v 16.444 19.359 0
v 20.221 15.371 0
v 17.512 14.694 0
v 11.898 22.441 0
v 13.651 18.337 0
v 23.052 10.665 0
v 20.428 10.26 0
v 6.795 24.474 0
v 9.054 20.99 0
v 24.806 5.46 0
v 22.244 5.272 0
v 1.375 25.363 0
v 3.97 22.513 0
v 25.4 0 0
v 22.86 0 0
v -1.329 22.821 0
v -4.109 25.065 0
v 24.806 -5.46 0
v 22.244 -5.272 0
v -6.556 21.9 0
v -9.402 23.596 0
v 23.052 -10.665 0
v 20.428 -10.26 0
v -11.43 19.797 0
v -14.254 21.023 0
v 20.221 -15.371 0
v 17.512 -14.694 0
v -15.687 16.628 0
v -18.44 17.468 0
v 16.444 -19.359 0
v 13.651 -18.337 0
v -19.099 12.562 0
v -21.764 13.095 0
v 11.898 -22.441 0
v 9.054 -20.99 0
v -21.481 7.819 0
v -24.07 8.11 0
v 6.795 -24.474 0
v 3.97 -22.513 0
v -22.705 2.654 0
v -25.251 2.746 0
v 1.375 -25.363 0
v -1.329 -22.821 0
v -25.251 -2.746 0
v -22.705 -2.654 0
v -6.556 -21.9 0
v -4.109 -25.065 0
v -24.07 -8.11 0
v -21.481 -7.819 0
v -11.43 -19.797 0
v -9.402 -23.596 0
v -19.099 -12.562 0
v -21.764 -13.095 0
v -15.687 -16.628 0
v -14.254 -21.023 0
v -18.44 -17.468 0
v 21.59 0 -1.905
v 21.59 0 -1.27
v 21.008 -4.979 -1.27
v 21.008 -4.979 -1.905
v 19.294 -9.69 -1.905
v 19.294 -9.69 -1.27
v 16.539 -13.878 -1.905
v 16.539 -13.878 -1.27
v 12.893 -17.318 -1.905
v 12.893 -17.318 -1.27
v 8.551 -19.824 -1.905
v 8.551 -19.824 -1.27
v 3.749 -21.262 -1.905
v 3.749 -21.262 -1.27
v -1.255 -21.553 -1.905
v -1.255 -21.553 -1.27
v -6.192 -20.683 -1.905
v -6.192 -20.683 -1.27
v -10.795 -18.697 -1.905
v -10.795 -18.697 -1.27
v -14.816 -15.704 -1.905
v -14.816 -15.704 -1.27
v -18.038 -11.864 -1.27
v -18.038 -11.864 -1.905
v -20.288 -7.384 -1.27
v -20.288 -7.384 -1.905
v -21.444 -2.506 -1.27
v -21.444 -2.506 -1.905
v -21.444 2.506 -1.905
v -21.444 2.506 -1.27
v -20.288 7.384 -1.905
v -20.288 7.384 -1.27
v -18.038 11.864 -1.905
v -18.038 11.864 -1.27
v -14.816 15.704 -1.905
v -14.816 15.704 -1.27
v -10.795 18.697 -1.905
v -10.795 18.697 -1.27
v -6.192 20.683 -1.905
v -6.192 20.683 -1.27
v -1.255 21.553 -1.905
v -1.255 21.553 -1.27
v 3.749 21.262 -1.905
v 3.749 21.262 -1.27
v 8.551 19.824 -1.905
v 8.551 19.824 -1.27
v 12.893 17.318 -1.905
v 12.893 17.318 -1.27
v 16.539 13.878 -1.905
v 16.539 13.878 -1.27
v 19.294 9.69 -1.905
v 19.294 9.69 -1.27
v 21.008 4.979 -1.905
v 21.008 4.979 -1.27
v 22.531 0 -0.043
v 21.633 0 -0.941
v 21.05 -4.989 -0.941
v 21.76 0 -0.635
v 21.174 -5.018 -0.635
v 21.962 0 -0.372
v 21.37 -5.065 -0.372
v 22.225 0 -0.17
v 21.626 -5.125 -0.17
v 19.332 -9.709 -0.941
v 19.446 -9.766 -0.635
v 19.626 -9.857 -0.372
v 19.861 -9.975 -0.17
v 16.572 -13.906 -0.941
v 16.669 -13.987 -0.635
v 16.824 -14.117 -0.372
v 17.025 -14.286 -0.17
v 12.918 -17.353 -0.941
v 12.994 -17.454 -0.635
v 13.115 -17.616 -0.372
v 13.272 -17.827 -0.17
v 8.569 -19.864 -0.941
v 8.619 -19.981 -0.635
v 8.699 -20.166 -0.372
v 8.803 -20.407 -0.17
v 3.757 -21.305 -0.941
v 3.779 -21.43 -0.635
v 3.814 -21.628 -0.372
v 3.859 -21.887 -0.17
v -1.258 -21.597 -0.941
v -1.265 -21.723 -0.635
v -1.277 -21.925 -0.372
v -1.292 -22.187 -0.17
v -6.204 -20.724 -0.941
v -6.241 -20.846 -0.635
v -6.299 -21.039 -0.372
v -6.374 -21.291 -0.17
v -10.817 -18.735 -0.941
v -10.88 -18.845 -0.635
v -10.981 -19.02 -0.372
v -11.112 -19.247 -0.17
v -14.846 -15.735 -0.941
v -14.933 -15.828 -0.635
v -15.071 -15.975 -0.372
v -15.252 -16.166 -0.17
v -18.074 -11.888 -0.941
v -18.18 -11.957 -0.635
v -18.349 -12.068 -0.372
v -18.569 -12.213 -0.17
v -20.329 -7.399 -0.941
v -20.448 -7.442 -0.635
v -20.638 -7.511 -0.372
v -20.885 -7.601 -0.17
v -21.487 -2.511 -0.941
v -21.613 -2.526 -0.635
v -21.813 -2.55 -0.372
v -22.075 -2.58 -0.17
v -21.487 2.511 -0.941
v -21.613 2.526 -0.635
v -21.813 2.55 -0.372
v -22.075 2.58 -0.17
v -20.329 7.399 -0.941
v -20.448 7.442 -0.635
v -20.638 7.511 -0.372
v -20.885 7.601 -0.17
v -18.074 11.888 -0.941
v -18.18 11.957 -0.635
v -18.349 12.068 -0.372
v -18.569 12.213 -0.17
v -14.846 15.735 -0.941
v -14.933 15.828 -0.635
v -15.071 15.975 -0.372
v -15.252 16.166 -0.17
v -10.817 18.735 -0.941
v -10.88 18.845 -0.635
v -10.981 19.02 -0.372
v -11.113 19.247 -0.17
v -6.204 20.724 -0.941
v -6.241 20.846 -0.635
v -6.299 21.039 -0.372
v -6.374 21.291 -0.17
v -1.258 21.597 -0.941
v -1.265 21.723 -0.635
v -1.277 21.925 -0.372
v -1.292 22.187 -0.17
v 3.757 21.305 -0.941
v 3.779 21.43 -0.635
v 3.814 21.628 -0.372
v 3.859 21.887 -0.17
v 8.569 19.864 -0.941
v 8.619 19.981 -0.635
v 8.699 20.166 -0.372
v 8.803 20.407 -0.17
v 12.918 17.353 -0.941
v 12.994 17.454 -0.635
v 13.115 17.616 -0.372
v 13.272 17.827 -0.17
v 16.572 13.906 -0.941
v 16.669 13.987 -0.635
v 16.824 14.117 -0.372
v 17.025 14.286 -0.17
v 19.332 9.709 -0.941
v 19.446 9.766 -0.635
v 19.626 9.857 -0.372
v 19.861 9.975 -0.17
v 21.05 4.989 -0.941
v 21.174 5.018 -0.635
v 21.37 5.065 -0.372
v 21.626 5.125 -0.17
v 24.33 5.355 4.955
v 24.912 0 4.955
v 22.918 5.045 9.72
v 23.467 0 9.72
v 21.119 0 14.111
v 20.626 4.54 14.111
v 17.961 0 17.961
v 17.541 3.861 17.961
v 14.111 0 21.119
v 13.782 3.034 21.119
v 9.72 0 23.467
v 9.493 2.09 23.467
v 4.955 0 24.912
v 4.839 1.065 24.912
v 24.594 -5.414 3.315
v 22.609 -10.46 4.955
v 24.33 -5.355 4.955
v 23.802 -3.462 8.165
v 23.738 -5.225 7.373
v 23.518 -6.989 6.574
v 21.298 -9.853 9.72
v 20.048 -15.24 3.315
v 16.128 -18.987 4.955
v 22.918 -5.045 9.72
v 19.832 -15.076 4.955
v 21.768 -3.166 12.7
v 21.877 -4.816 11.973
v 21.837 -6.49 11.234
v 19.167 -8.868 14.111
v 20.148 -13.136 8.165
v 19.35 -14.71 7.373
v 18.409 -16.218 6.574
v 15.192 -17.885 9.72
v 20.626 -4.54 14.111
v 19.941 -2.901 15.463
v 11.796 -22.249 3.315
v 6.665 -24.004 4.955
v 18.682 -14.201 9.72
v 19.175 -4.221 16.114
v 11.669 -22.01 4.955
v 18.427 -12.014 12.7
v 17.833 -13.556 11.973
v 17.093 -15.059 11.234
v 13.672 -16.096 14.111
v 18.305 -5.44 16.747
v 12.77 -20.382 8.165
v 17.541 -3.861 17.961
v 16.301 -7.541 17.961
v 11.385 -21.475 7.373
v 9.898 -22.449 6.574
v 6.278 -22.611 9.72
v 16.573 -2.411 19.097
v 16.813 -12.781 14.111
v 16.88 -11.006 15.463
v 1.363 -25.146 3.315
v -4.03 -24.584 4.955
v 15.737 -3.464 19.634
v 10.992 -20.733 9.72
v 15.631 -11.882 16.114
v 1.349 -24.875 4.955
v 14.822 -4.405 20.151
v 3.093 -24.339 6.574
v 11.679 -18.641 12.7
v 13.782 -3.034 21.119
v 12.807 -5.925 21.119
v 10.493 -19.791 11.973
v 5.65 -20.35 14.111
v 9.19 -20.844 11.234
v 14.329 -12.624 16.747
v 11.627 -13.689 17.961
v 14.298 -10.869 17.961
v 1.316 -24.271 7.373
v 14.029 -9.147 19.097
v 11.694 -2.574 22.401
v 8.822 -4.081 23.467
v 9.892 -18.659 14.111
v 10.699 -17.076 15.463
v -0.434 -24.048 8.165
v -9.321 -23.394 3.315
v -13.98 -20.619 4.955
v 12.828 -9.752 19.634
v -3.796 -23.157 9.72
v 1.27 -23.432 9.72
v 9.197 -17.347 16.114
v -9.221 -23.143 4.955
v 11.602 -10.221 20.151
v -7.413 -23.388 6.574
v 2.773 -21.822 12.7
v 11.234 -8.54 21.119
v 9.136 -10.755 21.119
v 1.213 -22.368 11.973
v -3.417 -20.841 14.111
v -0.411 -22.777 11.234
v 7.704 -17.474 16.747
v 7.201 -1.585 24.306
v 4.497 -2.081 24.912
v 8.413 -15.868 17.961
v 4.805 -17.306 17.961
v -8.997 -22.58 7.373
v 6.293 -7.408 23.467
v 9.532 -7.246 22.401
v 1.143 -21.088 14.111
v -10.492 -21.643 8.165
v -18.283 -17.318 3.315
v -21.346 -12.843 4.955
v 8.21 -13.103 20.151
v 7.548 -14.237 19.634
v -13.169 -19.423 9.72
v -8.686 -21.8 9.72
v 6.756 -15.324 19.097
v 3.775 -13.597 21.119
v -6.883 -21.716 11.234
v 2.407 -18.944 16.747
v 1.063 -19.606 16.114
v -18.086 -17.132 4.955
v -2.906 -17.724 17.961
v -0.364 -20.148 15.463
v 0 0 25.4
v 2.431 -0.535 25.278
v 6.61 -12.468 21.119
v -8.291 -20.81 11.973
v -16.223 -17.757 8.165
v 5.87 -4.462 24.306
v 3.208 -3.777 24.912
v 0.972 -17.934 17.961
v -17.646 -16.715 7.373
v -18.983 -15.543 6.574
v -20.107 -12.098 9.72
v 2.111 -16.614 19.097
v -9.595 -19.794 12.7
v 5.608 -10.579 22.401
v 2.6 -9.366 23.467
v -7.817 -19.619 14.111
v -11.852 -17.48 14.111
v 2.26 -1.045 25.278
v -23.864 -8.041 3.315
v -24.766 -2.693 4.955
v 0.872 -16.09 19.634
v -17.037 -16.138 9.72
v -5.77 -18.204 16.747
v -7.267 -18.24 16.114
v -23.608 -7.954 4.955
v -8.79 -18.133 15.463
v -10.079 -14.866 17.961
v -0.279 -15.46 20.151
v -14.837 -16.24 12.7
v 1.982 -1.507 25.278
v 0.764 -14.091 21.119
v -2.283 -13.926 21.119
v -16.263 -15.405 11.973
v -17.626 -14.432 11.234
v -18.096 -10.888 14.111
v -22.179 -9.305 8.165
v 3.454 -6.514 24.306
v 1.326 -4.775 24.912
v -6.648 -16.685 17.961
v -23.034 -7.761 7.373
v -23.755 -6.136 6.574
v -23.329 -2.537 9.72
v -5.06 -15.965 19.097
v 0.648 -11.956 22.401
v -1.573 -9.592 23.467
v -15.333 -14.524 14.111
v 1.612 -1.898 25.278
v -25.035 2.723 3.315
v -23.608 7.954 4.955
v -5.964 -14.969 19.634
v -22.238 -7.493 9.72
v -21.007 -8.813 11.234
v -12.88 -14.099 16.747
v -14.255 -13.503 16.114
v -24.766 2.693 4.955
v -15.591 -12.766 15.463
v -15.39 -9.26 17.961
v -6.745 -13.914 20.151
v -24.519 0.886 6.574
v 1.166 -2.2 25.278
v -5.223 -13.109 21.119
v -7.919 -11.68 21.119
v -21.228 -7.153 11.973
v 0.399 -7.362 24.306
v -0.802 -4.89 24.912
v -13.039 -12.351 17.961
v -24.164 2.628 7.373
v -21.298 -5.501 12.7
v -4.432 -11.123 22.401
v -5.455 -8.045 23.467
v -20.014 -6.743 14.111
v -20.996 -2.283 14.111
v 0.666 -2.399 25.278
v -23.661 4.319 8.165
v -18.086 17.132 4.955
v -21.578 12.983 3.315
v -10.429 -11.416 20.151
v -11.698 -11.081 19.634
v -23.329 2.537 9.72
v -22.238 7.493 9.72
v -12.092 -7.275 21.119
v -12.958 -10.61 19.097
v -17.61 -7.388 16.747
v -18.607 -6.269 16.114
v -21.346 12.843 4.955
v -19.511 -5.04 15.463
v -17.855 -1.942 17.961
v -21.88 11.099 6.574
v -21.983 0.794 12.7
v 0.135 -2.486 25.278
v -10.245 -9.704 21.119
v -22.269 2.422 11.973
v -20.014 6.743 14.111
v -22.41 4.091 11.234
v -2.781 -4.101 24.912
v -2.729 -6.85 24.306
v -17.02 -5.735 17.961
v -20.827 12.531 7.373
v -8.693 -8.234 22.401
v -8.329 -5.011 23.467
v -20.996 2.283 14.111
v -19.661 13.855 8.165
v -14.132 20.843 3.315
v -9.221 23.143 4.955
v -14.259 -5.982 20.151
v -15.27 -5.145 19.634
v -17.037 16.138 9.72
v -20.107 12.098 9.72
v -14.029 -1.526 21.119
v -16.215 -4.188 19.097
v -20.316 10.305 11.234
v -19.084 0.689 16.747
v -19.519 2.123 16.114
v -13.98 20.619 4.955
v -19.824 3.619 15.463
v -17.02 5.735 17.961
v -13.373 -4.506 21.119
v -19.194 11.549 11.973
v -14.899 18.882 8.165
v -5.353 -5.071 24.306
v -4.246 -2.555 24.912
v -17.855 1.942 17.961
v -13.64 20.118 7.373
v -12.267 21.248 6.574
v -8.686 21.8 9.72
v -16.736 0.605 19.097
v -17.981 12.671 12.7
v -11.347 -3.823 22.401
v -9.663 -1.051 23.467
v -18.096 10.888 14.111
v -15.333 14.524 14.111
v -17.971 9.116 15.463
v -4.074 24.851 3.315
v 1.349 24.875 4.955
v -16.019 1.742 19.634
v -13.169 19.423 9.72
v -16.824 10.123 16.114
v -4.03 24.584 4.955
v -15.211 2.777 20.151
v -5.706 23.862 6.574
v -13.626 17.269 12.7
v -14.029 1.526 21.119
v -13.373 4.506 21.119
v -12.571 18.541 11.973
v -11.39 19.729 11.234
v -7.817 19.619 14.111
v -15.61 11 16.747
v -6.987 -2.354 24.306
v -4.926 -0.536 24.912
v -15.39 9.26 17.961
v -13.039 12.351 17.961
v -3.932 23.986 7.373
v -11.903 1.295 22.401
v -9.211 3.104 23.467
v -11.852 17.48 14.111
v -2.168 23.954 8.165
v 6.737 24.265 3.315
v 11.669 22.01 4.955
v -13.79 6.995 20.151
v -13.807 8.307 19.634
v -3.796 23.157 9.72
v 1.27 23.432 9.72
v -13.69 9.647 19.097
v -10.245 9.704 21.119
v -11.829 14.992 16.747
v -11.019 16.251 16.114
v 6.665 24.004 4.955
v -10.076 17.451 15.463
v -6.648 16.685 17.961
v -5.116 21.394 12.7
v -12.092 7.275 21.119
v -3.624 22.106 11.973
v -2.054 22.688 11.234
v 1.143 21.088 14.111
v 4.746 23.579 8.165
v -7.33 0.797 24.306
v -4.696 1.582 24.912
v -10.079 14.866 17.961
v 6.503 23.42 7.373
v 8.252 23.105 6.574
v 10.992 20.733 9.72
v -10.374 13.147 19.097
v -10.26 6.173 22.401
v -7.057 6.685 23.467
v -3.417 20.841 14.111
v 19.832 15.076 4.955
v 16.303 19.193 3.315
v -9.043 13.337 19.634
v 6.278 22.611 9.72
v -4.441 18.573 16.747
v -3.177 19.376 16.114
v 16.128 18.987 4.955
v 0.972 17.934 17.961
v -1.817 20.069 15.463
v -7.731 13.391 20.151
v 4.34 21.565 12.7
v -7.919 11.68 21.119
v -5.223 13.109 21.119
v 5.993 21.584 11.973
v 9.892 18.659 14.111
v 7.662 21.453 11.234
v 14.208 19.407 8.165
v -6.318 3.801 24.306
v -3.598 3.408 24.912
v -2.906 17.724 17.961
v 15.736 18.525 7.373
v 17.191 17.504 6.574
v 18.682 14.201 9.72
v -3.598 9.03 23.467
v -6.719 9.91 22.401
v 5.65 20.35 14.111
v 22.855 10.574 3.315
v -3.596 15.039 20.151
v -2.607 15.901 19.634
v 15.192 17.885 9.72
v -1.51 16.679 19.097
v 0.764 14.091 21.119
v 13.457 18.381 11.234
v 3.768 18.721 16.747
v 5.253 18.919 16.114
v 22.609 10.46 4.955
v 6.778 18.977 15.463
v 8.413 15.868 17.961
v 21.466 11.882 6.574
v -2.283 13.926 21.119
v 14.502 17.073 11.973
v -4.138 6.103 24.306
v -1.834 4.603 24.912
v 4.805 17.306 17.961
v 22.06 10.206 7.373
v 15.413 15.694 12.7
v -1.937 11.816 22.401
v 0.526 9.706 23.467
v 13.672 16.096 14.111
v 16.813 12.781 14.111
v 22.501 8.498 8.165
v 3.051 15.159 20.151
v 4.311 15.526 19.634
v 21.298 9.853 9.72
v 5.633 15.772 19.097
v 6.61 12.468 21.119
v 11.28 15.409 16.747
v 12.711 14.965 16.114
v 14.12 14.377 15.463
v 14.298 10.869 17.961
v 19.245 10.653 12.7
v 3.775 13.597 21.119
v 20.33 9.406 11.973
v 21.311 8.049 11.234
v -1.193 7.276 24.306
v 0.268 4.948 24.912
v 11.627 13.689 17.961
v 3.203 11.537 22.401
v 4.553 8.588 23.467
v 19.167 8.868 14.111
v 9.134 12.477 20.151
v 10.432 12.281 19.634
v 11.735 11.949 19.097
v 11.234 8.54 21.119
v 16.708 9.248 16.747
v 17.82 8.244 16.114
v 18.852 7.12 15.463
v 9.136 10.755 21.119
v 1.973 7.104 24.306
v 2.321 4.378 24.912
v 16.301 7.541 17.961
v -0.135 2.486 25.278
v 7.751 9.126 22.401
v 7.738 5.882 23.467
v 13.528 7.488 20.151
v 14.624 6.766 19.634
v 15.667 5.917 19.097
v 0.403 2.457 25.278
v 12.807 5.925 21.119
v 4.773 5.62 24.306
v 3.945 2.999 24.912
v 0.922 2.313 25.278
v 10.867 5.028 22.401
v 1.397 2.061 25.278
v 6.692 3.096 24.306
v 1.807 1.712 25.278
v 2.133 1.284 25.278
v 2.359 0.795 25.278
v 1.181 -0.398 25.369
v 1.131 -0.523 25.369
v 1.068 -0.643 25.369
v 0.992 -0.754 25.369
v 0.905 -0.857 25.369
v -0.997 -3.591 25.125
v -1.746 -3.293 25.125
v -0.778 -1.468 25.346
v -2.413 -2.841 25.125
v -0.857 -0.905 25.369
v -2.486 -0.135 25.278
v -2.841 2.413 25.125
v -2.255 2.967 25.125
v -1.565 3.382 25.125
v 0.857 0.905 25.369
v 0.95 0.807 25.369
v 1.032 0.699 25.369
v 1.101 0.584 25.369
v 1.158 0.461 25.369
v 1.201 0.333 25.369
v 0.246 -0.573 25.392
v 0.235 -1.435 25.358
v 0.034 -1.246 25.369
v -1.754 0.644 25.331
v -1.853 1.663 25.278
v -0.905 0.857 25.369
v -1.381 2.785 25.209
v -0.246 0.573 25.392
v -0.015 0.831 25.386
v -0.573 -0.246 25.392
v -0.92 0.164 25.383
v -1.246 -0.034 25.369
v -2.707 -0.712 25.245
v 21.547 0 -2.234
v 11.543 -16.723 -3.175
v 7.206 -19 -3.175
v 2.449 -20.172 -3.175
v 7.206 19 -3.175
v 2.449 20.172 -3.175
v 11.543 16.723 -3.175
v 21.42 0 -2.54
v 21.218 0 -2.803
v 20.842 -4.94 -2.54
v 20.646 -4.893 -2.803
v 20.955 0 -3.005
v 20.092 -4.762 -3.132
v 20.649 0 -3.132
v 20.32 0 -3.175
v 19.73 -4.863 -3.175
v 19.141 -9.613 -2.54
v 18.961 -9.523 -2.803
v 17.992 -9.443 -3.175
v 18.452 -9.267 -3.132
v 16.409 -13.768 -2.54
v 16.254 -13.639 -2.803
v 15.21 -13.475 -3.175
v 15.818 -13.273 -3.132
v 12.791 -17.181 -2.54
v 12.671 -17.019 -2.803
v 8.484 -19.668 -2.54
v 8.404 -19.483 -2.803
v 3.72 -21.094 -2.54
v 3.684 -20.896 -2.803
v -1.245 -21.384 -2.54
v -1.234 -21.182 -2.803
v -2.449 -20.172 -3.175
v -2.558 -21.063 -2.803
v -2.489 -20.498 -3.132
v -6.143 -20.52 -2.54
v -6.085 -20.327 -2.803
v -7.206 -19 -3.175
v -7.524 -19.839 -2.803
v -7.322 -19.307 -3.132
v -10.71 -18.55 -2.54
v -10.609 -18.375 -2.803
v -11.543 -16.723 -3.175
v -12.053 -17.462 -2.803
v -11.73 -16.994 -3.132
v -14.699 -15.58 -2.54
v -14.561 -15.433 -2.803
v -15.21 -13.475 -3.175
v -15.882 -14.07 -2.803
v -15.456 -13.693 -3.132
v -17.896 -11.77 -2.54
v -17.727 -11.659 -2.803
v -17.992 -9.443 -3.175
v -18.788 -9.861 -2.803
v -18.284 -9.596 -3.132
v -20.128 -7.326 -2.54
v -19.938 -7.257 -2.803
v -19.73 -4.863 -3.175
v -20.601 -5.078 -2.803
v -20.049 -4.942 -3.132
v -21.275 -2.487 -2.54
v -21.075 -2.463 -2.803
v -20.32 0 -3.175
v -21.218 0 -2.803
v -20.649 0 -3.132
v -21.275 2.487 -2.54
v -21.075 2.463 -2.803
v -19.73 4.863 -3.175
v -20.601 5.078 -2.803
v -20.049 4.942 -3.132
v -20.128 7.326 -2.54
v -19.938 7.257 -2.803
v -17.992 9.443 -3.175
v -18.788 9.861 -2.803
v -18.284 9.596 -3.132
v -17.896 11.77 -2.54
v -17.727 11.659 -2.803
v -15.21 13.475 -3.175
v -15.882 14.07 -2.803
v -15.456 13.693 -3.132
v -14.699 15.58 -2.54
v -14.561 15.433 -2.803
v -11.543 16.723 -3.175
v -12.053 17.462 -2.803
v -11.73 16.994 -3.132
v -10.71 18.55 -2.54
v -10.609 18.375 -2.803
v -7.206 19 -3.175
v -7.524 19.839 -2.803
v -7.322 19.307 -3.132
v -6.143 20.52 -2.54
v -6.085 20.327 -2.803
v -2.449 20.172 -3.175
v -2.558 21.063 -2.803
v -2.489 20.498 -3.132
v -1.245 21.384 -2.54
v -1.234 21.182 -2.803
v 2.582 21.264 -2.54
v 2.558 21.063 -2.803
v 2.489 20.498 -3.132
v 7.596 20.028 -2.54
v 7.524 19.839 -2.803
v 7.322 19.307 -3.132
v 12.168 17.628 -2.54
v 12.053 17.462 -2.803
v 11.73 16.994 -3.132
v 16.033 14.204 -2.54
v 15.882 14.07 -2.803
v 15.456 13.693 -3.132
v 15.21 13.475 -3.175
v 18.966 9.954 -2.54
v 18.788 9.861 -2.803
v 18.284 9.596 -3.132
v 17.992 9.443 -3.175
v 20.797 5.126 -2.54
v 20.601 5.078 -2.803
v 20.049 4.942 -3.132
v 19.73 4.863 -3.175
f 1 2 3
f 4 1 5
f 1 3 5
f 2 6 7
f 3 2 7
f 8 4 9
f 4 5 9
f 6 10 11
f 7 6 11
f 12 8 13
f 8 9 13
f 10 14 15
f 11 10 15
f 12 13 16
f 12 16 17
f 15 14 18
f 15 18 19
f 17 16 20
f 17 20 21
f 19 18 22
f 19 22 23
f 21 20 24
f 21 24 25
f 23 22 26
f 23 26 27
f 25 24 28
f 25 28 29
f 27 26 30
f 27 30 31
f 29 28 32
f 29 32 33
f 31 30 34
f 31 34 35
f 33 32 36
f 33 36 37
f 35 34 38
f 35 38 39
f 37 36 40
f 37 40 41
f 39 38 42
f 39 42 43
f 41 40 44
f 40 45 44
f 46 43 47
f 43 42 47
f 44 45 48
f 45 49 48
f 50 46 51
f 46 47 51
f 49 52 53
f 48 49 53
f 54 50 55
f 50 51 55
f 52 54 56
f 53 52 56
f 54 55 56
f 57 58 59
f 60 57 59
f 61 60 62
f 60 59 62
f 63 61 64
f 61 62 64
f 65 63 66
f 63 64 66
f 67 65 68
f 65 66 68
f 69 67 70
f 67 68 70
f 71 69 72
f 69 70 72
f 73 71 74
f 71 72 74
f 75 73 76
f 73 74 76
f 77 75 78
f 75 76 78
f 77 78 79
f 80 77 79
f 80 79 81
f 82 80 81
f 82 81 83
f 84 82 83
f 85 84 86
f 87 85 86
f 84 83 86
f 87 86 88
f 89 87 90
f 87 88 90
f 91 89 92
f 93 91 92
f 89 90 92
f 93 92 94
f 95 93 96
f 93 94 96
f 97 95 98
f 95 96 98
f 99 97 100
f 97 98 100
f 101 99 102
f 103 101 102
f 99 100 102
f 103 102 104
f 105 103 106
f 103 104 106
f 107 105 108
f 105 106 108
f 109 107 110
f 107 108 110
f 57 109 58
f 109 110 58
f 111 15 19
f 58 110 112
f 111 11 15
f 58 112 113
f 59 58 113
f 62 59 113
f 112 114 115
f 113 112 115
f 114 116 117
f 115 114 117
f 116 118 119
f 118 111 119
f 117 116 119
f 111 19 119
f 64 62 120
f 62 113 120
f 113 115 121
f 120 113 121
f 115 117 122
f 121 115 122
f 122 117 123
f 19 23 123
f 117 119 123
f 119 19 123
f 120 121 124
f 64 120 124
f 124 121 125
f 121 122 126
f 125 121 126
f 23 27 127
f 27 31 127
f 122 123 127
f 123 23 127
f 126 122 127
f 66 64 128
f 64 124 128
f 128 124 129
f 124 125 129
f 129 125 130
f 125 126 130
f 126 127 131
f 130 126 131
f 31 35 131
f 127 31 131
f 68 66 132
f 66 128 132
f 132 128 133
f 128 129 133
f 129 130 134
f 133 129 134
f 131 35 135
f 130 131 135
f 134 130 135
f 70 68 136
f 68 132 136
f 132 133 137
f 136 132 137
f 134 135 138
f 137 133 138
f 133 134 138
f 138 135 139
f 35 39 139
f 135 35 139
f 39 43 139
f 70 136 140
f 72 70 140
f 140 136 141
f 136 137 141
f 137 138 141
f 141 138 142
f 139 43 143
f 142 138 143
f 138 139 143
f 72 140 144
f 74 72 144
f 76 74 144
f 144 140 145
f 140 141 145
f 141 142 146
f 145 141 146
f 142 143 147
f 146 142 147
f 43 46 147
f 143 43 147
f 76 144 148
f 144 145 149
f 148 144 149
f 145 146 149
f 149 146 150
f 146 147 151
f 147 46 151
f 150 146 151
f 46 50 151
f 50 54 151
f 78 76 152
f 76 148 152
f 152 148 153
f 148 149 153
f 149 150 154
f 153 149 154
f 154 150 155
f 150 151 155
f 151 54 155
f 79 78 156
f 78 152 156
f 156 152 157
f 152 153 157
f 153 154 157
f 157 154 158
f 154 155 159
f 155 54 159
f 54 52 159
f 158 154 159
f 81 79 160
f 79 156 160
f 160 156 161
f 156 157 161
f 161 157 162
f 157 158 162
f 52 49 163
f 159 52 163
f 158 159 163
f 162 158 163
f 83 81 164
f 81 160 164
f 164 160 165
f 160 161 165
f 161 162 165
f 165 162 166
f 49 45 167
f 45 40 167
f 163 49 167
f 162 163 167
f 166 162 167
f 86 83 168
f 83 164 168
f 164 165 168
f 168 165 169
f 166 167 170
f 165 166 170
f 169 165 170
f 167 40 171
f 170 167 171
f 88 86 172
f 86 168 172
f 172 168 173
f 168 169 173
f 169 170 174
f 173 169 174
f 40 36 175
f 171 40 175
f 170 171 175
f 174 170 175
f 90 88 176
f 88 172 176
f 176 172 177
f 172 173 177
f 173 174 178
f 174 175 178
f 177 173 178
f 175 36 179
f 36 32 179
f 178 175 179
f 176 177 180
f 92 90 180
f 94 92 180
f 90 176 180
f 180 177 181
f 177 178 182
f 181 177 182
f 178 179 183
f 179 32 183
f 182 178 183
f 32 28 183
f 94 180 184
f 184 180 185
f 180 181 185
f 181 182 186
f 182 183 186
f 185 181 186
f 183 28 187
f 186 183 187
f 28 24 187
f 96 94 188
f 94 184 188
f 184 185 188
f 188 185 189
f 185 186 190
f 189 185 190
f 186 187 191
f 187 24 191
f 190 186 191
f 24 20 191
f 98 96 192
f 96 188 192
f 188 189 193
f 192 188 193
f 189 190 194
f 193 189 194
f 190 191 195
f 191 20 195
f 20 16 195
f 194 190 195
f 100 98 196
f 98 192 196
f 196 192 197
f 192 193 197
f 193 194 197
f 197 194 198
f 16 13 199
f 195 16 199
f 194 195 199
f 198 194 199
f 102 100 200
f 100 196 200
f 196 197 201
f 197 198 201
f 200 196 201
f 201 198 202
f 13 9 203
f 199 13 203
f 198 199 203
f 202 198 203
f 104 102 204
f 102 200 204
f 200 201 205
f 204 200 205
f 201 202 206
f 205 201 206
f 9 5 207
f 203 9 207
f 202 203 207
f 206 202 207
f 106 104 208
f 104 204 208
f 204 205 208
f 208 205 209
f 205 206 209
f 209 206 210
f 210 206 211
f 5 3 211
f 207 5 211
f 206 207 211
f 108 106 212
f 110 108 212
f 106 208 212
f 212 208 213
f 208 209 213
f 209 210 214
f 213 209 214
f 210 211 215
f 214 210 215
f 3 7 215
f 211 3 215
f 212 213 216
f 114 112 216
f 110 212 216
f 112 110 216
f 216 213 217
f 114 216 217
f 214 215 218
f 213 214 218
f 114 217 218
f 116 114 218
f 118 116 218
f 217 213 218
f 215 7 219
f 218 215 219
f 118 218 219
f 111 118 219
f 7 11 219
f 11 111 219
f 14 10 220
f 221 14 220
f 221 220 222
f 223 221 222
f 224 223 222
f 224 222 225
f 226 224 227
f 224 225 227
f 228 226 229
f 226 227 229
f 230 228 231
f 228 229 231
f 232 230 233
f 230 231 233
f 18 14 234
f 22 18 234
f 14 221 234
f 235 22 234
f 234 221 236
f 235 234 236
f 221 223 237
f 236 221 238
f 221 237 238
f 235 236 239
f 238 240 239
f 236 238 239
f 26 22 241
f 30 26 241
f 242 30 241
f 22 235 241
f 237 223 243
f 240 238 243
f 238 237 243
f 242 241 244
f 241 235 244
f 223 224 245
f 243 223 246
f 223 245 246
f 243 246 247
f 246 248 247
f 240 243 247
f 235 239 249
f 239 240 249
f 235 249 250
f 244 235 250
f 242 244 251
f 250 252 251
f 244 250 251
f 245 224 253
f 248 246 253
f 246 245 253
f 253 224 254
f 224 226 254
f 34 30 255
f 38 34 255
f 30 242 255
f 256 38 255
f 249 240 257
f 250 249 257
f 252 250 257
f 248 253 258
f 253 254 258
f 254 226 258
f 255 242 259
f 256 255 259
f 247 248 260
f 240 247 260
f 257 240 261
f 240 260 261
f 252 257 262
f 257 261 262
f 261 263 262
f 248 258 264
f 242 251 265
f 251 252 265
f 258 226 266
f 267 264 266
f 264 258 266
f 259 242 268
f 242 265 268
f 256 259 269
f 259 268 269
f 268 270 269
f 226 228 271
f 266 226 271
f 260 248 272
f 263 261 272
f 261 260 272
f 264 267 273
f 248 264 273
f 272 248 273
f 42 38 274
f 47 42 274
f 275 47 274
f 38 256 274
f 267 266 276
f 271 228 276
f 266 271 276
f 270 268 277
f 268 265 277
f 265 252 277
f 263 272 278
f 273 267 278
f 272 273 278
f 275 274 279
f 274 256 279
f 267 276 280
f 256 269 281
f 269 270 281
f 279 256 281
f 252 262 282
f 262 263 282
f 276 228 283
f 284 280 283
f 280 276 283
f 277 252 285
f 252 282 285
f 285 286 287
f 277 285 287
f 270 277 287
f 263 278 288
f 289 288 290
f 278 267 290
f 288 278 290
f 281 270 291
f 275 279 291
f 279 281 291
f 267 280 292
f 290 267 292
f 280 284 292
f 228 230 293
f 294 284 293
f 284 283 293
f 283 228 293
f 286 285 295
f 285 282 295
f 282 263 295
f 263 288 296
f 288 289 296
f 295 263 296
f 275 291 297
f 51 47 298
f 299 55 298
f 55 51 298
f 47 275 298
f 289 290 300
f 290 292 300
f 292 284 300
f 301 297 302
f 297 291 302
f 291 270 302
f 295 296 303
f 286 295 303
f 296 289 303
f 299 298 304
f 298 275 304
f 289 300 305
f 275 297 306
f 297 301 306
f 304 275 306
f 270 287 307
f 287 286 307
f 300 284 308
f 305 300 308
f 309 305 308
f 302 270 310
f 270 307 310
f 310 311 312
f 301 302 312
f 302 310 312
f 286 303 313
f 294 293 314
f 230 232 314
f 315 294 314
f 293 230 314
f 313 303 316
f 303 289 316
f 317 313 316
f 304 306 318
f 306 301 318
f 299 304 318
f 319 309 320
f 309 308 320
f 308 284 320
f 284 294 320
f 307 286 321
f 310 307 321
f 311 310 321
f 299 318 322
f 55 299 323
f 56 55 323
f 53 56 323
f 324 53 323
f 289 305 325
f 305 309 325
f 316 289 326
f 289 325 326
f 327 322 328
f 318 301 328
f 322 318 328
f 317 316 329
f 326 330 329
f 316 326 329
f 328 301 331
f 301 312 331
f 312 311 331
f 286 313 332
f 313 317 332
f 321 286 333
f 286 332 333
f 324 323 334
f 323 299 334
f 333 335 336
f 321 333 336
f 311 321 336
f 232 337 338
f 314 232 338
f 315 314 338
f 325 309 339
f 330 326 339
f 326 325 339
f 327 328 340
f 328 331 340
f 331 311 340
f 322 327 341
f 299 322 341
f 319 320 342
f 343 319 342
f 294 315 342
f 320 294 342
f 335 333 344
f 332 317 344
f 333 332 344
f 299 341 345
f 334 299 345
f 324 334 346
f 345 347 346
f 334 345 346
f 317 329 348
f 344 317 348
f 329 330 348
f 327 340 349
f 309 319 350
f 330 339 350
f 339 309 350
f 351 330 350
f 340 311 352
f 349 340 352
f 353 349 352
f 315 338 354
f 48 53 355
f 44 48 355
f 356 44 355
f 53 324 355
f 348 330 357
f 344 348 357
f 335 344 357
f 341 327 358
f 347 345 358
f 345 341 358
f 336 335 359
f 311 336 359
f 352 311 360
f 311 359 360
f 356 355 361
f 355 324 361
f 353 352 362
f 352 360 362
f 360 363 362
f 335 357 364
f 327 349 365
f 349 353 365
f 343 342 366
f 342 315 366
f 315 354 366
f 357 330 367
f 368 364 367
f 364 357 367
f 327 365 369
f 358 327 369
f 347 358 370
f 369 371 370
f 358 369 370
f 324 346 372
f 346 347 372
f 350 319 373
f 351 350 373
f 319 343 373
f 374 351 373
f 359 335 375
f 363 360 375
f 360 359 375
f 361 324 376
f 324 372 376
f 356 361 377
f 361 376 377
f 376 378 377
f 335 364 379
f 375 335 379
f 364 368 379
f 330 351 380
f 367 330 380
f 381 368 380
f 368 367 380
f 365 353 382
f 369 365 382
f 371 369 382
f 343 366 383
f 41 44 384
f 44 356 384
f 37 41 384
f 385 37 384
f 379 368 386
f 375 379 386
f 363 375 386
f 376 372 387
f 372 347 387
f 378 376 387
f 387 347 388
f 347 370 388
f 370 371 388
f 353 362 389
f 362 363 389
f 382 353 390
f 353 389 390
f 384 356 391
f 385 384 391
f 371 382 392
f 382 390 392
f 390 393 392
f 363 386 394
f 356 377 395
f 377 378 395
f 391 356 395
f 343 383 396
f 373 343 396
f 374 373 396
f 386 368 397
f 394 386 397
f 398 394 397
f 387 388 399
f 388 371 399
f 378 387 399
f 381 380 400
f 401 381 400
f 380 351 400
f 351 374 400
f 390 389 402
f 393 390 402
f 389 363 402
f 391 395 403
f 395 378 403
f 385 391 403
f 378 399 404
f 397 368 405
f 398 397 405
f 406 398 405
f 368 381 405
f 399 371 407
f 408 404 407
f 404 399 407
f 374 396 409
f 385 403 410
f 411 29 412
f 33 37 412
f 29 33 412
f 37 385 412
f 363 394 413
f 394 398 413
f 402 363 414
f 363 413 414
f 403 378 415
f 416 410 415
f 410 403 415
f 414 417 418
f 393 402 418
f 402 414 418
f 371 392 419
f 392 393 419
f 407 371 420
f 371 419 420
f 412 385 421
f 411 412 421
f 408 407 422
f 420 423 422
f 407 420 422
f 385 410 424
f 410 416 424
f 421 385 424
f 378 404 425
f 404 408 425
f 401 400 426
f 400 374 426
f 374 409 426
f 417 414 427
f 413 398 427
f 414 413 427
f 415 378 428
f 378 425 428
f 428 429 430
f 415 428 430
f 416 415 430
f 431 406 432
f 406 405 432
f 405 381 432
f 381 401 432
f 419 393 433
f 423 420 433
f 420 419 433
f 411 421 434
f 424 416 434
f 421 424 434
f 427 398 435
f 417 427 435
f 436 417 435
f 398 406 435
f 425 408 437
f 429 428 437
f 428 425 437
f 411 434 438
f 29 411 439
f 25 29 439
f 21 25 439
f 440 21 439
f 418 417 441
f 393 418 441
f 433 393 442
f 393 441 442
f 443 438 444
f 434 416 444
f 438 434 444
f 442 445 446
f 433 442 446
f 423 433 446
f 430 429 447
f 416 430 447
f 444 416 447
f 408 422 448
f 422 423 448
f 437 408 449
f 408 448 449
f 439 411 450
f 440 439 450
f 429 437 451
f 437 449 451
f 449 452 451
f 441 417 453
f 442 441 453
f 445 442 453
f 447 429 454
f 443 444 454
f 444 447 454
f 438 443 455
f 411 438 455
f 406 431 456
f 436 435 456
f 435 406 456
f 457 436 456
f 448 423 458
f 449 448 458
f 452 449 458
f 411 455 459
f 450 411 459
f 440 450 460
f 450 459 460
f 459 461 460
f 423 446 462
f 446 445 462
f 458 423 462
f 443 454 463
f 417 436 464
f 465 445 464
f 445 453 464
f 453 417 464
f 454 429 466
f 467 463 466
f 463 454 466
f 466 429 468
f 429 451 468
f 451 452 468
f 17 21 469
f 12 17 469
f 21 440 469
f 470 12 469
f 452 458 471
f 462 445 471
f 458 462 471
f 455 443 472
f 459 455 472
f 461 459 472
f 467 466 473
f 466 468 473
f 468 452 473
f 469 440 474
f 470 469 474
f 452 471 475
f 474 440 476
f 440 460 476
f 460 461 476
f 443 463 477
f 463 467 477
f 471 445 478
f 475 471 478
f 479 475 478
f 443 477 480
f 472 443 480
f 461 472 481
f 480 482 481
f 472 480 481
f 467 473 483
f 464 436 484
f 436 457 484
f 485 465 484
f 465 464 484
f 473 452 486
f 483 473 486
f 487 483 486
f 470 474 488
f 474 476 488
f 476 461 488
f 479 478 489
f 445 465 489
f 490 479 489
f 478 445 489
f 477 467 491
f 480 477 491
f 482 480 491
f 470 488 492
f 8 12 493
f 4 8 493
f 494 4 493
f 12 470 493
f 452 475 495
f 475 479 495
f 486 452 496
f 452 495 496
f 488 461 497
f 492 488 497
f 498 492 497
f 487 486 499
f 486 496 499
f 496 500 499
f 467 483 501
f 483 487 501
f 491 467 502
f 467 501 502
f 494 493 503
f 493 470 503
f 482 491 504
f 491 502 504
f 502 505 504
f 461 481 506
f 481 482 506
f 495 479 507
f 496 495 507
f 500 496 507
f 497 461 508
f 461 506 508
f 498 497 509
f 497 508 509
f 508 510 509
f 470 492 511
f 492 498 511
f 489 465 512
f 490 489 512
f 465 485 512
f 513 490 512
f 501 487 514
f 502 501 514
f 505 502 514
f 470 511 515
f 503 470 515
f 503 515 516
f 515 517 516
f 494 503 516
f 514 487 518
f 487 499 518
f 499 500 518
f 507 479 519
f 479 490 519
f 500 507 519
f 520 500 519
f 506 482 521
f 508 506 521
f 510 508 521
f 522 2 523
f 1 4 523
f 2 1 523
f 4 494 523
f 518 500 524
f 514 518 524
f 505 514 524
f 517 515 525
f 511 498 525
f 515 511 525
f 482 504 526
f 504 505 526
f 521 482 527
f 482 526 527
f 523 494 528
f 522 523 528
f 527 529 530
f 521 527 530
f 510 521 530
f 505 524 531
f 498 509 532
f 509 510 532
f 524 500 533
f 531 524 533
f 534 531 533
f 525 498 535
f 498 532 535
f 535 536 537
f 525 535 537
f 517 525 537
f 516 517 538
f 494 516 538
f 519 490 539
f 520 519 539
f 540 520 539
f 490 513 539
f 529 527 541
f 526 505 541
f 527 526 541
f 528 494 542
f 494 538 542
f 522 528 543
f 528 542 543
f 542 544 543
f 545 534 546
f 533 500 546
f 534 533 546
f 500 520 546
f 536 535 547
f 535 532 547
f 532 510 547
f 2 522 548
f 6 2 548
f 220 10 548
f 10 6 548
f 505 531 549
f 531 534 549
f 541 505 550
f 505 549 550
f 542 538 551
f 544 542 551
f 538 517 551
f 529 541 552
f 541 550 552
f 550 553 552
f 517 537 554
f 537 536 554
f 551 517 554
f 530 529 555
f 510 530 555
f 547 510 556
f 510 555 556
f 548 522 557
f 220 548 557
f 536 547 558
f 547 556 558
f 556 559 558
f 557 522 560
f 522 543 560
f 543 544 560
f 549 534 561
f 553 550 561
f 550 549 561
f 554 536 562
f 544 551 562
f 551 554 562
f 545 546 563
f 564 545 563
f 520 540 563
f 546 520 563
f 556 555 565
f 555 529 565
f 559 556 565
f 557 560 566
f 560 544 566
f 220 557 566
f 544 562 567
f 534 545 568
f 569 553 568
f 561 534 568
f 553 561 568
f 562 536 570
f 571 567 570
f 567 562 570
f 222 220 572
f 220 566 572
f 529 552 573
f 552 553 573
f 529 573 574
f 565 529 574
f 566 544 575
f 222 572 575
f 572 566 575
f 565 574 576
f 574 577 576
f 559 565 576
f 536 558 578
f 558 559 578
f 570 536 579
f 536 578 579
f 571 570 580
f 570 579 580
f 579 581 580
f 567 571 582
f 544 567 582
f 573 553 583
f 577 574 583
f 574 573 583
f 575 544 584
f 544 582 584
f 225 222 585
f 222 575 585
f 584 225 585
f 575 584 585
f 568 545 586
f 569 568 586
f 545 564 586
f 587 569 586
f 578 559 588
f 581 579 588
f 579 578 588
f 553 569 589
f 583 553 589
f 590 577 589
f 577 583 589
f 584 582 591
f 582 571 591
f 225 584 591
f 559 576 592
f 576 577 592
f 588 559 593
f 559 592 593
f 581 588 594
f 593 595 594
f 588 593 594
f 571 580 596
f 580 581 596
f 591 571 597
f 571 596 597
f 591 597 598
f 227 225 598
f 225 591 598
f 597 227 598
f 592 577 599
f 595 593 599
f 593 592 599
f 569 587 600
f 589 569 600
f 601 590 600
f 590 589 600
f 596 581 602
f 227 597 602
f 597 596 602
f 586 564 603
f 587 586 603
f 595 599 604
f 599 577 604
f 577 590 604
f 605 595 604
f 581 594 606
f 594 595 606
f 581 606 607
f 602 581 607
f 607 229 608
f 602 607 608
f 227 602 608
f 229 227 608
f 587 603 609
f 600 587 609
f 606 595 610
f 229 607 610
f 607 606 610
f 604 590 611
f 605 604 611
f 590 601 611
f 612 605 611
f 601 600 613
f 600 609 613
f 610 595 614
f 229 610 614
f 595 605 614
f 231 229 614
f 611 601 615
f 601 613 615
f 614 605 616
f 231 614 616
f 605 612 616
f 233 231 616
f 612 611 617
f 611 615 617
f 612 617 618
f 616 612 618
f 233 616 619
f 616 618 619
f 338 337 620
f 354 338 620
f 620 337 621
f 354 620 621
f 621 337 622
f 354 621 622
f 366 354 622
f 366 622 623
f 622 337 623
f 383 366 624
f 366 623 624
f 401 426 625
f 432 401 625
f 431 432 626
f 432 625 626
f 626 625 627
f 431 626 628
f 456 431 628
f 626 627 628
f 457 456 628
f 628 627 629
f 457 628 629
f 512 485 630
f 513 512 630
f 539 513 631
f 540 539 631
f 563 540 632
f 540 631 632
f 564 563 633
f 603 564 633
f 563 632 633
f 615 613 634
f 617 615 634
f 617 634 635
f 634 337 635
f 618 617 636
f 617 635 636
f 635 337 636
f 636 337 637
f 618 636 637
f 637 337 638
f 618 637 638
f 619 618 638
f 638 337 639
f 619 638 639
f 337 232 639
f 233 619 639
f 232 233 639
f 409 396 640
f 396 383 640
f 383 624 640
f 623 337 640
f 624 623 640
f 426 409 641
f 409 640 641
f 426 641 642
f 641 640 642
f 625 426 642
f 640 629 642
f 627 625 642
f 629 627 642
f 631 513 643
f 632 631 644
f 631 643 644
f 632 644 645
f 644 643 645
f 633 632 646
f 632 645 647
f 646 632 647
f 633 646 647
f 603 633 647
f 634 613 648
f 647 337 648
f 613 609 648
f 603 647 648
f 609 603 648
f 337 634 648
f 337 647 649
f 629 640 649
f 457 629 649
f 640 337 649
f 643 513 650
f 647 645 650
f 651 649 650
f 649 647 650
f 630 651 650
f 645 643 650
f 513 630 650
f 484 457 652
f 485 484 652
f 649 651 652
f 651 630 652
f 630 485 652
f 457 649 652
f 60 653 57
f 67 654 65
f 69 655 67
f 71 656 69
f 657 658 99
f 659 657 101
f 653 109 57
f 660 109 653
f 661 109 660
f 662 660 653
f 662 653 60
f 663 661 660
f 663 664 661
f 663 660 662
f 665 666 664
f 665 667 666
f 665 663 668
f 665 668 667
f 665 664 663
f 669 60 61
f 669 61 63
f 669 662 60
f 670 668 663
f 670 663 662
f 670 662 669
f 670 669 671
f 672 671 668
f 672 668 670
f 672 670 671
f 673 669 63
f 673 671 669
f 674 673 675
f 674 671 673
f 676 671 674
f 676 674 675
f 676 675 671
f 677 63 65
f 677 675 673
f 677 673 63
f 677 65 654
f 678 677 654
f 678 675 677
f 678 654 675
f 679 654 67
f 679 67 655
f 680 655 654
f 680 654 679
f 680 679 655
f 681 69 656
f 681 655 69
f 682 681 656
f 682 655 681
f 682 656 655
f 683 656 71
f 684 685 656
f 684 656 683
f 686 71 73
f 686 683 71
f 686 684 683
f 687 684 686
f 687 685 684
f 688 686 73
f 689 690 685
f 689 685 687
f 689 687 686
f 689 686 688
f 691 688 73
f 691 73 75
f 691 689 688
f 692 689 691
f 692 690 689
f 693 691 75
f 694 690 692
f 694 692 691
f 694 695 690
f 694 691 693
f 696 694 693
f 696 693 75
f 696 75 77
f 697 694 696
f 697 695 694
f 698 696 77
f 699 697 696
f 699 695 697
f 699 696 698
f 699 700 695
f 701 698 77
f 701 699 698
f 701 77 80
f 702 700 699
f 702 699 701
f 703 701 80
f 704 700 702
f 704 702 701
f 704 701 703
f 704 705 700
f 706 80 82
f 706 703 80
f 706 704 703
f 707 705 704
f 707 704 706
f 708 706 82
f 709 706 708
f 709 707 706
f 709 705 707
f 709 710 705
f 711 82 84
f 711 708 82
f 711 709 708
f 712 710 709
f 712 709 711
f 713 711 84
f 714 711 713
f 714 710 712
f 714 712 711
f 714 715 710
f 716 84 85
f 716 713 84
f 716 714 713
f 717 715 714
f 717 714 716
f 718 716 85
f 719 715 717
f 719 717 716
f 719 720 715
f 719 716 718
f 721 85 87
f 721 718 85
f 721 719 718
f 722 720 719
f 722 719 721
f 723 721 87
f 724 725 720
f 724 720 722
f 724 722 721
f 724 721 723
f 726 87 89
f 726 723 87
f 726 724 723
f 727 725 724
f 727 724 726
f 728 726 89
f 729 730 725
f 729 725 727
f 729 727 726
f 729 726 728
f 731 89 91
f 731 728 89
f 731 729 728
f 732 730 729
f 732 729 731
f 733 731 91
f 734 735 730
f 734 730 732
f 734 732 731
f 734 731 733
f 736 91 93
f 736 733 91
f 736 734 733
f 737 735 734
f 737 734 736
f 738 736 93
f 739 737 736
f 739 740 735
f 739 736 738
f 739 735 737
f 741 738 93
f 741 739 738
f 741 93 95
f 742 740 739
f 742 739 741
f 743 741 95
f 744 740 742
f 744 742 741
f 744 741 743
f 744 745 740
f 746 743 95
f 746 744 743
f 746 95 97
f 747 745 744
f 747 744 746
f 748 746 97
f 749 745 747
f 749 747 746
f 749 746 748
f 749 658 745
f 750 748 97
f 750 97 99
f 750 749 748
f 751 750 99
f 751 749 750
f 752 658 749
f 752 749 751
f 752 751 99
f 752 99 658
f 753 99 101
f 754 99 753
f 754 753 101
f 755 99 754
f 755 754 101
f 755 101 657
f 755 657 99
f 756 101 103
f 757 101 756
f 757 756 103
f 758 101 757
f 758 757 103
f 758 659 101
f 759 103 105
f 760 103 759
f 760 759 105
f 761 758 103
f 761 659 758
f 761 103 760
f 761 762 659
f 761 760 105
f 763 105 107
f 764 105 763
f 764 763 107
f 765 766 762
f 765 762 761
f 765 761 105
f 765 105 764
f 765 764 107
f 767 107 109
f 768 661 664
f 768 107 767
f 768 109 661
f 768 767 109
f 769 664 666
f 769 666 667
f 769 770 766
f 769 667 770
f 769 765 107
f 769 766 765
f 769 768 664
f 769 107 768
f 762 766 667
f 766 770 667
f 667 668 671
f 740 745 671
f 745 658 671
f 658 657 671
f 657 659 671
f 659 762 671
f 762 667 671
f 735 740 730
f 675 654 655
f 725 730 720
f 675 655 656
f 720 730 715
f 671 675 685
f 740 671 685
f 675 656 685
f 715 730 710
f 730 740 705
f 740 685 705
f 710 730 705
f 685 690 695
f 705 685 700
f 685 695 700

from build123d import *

# Parameters (mm, degrees)
F2_R = 1.27
F3_R = 1.27


with BuildPart() as f1:
    # F0 (on Front) → F1 (revolve)
    with BuildSketch(Plane.XZ):
        with BuildLine():
            Line((0, -3.175), (21.59, -3.175))
            Line((21.59, -3.175), (21.59, 0))
            Line((21.59, 0), (25.4, 0))
            ThreePointArc((25.4, 0), (17.960512, 17.960512), (0, 25.4))
            Line((0, 25.4), (0, -3.175))
        make_face()
    revolve(axis=Axis((0, 0, 11.1125), (0, 0, -1)))

    # F2
    f2_edges = [f1.edges().sort_by_distance(p)[0] for p in [
        (-21.59, 0, 0),
    ]]
    fillet(f2_edges, radius=F2_R)

    # F3
    f3_edges = [f1.edges().sort_by_distance(p)[0] for p in [
        (-21.59, 0, -3.175),
    ]]
    fillet(f3_edges, radius=F3_R)


solid = f1.part
